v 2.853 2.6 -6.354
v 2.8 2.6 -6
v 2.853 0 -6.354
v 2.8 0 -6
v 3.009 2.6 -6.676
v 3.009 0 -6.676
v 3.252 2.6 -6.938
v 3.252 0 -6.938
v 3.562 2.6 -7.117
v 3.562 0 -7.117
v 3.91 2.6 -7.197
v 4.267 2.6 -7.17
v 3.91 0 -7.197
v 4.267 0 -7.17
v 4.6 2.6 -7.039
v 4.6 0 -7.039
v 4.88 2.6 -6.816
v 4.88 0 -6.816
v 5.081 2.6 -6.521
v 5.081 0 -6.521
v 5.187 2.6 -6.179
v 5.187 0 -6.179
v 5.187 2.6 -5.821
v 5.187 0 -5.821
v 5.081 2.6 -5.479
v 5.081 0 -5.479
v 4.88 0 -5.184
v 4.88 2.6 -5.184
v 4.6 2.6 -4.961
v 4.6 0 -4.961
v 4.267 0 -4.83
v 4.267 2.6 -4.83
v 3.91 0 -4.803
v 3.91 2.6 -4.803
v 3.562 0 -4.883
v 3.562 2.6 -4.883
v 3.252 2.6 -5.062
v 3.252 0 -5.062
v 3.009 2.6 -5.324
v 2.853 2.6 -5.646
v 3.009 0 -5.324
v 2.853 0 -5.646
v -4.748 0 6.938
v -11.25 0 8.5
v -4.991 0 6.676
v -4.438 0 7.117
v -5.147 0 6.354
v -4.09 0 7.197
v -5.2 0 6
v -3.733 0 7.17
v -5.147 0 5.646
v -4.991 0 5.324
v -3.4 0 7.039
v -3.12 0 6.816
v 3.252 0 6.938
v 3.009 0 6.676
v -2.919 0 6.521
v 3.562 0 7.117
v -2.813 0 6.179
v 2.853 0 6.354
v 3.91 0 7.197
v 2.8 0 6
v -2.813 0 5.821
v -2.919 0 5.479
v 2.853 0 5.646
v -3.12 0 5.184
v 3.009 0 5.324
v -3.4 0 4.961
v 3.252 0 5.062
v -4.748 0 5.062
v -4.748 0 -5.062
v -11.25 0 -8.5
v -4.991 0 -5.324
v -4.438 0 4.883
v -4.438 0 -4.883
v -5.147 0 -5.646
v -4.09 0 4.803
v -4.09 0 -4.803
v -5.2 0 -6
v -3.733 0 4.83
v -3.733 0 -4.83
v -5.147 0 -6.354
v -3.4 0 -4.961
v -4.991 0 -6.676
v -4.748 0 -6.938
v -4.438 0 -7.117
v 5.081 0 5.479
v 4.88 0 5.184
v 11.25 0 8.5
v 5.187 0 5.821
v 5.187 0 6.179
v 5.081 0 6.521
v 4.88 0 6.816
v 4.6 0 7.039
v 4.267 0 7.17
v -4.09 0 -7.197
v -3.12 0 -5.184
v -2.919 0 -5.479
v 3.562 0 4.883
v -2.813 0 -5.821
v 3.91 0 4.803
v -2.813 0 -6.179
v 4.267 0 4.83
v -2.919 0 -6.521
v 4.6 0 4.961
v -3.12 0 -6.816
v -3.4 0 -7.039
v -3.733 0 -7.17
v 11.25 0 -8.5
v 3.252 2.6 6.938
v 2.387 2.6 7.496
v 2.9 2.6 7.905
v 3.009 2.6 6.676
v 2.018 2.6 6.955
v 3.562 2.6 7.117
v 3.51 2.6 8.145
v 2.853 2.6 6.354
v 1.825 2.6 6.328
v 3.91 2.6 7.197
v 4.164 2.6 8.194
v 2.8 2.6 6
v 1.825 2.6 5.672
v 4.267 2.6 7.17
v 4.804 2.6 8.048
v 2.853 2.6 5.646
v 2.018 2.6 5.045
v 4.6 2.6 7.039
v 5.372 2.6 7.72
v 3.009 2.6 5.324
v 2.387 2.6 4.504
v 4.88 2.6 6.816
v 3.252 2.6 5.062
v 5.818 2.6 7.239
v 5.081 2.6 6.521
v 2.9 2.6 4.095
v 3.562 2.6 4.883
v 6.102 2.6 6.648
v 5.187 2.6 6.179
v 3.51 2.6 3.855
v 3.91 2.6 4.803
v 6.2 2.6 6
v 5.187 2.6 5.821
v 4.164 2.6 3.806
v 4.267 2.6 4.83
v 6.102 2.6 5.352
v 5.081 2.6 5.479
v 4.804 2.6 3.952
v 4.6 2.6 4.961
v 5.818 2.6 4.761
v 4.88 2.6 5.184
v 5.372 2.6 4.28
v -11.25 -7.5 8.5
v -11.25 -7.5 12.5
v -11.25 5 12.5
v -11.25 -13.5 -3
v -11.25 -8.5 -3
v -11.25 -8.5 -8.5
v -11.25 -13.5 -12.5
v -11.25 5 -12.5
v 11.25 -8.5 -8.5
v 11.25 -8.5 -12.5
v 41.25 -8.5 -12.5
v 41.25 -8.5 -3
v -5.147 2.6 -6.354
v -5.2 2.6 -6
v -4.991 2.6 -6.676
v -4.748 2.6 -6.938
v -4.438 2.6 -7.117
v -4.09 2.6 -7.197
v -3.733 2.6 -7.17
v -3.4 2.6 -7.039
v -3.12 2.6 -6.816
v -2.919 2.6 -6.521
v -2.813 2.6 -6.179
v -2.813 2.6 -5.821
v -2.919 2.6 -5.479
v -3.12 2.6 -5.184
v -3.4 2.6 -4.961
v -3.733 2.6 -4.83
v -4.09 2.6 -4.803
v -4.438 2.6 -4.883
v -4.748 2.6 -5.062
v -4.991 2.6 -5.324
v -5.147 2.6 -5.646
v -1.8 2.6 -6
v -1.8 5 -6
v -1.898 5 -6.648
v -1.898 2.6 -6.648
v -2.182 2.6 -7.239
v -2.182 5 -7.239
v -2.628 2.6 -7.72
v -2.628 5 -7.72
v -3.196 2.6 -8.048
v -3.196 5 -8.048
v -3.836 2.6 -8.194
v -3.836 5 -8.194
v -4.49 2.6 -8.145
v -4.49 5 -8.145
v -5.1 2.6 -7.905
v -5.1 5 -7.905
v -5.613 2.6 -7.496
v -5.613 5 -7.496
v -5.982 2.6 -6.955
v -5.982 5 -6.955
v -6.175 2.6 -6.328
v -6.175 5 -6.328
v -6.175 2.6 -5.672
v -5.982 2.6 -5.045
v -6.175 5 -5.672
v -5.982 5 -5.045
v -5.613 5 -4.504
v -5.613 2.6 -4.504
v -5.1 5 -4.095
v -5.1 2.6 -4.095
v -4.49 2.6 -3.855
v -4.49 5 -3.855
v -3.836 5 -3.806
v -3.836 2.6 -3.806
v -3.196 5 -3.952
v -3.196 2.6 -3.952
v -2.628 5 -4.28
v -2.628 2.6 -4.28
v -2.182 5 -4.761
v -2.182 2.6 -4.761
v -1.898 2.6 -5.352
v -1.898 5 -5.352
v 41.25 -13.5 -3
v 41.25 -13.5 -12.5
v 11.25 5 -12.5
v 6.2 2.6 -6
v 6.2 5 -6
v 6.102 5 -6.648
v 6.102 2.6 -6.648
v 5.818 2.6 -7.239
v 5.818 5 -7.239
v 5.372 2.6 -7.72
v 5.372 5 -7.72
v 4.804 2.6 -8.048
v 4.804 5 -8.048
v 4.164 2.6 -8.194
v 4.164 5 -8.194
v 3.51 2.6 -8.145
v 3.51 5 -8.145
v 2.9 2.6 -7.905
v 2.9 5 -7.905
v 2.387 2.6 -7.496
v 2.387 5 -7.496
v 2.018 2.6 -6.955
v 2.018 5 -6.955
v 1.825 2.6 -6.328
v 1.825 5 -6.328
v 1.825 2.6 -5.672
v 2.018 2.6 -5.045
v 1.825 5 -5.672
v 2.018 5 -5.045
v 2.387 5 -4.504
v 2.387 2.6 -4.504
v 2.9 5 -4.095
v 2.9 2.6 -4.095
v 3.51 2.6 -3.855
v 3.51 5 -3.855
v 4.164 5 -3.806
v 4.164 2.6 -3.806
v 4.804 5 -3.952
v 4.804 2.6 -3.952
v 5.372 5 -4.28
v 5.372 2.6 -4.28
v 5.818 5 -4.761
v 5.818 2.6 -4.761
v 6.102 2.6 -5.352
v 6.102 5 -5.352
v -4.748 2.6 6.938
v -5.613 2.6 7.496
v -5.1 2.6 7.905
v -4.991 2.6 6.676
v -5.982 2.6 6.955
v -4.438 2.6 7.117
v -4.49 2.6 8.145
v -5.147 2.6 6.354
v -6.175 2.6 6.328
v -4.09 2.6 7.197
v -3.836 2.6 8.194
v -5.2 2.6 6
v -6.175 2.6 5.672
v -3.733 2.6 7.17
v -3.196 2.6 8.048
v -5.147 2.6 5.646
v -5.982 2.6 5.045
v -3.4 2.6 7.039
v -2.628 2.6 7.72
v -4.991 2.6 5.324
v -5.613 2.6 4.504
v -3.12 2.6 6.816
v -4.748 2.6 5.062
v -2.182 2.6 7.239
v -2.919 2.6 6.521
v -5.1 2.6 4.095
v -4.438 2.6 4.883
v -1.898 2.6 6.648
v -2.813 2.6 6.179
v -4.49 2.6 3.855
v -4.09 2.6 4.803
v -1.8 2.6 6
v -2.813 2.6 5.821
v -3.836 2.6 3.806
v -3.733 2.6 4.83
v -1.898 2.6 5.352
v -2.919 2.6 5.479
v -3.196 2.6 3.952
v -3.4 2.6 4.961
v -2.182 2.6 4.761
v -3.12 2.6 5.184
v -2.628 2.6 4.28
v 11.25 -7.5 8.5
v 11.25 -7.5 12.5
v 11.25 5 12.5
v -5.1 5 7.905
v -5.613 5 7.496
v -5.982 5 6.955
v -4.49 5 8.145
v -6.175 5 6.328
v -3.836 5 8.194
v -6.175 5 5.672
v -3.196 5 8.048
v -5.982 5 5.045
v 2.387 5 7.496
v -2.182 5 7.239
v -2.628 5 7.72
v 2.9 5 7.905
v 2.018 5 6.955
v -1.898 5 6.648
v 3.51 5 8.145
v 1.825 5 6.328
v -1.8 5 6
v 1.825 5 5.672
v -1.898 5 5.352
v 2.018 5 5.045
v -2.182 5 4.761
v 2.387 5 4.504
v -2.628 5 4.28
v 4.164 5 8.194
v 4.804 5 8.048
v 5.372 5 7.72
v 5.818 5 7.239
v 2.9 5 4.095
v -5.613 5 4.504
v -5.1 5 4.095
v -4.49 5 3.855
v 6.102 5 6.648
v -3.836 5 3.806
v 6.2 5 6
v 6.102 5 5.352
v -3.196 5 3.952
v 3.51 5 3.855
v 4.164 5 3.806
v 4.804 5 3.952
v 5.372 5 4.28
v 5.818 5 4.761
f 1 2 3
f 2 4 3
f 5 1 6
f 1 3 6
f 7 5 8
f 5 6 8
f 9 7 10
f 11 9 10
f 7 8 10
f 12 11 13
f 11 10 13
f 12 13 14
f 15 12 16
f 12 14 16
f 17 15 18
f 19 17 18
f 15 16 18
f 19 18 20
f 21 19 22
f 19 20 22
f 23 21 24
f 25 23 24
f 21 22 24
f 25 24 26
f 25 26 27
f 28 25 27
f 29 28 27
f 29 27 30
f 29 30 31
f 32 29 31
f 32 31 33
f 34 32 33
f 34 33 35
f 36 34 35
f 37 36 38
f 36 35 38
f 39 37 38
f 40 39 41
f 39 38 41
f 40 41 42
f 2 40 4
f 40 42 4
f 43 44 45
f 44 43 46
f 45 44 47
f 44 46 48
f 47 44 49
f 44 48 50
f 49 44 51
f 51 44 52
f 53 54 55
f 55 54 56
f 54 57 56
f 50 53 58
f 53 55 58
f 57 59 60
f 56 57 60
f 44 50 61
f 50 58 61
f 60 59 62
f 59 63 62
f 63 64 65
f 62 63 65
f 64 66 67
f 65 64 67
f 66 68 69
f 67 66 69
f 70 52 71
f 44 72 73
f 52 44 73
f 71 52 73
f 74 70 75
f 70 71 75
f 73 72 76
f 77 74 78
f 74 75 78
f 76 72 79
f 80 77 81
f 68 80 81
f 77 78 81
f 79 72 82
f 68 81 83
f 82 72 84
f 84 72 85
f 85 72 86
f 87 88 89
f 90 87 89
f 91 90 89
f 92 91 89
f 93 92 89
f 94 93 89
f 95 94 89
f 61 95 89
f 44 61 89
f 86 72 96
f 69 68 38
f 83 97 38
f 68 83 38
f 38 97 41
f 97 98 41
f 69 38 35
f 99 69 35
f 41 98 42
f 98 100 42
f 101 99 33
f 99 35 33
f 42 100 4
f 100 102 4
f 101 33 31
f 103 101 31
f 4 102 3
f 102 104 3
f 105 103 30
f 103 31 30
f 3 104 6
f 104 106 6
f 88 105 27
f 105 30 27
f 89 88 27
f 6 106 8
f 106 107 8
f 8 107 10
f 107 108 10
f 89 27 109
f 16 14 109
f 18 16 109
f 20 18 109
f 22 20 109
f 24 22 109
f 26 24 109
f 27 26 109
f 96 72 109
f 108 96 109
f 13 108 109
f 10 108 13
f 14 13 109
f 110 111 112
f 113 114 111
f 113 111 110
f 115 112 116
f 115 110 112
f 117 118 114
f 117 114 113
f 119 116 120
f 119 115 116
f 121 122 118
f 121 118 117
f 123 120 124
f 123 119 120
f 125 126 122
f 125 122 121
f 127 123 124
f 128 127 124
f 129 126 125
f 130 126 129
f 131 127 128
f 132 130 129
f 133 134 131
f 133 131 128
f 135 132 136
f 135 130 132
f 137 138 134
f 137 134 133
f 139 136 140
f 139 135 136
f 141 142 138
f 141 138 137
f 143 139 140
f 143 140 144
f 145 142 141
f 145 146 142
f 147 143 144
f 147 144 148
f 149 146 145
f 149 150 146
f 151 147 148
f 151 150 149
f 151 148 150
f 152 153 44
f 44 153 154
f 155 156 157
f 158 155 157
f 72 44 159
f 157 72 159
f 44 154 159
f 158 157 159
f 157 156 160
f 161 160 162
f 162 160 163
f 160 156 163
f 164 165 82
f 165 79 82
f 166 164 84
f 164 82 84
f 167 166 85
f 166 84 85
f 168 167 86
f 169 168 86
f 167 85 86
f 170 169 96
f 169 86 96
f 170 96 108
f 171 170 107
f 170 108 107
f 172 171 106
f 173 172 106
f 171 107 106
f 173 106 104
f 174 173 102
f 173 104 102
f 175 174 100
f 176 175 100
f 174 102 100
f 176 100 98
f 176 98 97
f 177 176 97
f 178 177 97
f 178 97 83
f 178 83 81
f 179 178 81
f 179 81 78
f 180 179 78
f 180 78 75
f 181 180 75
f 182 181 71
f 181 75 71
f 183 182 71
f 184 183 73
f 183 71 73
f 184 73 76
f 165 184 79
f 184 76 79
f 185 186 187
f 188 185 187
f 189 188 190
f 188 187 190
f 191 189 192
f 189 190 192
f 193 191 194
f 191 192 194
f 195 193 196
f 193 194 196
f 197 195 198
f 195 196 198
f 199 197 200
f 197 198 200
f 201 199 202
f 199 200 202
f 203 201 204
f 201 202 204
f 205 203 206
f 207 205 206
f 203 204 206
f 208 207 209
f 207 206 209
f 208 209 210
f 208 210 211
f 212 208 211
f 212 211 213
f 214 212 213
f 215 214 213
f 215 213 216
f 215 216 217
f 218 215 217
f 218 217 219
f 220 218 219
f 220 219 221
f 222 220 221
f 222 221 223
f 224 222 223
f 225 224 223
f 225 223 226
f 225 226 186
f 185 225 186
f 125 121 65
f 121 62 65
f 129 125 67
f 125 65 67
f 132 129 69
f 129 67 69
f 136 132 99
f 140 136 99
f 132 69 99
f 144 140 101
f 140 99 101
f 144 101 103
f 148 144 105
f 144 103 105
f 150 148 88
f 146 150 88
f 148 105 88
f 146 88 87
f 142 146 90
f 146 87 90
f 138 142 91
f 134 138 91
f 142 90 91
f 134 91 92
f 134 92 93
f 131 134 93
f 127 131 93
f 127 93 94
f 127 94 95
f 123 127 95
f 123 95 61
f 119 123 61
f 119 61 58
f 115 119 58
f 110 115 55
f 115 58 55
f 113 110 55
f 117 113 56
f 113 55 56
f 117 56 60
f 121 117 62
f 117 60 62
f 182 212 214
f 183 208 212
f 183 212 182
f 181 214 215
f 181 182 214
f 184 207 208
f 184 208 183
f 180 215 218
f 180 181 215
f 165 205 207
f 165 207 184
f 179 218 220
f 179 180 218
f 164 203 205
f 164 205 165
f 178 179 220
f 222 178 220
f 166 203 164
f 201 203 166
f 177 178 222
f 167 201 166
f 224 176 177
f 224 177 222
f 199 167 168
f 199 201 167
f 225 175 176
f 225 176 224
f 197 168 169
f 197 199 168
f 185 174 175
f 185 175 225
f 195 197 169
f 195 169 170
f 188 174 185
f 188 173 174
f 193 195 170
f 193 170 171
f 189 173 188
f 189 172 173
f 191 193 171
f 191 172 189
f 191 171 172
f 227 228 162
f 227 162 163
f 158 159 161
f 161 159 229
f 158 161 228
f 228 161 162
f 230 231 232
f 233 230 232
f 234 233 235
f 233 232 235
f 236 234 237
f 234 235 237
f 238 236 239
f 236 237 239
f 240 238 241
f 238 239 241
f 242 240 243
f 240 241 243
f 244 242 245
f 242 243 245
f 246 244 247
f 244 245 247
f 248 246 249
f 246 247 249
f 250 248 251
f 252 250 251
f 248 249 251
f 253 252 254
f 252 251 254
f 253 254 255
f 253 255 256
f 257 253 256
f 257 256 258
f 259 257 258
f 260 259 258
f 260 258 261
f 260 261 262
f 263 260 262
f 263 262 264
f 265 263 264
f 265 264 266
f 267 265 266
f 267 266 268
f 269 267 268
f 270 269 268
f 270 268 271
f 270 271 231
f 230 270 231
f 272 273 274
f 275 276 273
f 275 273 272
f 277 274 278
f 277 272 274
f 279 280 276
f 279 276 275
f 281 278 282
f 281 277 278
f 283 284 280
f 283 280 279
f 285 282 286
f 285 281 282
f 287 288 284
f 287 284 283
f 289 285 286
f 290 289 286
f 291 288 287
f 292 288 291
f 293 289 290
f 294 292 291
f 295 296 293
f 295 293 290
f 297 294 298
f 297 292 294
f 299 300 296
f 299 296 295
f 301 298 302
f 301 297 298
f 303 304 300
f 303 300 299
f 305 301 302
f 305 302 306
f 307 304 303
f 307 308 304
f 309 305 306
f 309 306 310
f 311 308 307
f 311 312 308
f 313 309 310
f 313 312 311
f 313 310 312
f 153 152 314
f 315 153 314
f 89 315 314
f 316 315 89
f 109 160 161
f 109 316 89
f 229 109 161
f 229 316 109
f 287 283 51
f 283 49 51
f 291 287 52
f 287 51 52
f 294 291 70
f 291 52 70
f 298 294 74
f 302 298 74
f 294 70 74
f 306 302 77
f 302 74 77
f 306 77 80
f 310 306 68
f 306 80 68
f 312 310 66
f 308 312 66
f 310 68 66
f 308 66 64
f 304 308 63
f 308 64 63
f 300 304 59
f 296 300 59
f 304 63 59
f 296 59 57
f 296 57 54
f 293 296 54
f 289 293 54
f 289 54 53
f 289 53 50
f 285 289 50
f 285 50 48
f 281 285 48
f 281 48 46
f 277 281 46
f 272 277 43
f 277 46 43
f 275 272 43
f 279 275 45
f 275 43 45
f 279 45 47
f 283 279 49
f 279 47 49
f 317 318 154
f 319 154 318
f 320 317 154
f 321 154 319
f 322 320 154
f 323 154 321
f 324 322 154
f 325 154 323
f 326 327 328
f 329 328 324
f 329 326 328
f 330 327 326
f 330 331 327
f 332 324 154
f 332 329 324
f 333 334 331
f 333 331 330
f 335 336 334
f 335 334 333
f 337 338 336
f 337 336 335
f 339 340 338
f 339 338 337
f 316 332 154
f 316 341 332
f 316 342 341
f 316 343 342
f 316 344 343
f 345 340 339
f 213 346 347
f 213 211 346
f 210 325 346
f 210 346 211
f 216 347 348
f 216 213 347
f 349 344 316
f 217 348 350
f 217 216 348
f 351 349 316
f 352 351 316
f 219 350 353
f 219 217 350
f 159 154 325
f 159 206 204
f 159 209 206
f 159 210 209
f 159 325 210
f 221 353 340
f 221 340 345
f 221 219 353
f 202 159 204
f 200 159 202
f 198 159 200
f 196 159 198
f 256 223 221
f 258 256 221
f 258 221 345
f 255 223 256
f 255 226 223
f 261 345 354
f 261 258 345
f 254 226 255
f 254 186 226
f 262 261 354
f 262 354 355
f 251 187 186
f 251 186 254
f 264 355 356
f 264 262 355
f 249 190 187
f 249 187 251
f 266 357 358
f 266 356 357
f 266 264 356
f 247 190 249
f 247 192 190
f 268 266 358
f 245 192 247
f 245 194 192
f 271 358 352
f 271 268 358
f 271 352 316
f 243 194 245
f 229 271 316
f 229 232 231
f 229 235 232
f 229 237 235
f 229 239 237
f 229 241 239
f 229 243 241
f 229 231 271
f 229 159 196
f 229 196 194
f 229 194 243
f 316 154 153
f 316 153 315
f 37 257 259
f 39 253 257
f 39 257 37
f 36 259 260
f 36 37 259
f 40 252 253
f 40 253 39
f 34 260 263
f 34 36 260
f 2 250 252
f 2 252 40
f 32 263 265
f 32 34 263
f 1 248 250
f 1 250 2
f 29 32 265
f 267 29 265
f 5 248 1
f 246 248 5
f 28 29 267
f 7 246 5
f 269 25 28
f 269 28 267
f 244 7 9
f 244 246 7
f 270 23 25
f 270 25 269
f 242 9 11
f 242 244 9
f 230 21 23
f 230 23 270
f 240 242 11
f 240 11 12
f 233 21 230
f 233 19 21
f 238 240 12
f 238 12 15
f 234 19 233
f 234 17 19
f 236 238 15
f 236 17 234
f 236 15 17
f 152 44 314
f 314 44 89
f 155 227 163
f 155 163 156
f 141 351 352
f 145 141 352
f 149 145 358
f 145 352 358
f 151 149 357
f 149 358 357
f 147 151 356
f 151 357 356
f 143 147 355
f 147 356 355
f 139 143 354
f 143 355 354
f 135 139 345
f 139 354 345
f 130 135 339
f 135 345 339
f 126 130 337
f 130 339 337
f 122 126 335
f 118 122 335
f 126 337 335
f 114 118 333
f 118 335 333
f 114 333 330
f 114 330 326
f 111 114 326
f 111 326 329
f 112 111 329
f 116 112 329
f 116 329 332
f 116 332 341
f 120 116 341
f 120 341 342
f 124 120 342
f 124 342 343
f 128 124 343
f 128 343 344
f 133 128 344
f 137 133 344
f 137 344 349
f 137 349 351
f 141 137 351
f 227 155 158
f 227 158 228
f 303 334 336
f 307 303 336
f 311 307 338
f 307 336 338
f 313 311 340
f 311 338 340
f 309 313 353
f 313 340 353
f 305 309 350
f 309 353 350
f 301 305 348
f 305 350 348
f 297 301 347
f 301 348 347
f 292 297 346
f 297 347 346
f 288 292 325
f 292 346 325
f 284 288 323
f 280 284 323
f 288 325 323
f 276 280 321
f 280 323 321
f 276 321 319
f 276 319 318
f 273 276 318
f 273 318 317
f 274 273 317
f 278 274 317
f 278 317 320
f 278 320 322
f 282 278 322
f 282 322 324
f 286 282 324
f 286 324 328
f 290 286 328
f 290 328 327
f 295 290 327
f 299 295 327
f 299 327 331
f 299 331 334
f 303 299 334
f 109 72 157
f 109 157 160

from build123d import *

# Parameters (mm, degrees)
SKETCH1_W                                           = 22.5
SKETCH1_H                                           = 17
SKETCH1_H_2                                         = 25
BOSS_EXTRUDE1_DEPTH                                 = 5
SKETCH1_3_W                                         = 22.5
SKETCH1_3_H                                         = 4
BOSS_EXTRUDE2_DEPTH                                 = 13.5
CBORE_FOR_M2_HEX_SOCKET_HEAD_CAP_SCREW1_D           = 2.4
CBORE_FOR_M2_HEX_SOCKET_HEAD_CAP_SCREW1_CBORE_D     = 4.4
CBORE_FOR_M2_HEX_SOCKET_HEAD_CAP_SCREW1_CBORE_DEPTH = 2.4
BOSS_EXTRUDE3_DEPTH                                 = 5
SKETCH1_4_W                                         = 22.5
SKETCH1_4_H                                         = 4
BOSS_EXTRUDE4_DEPTH                                 = 7.5


with BuildPart() as part:
    # Sketch1 → Boss-Extrude1 (new body)
    with BuildSketch(Plane(origin=(0, 0, 0), x_dir=(1, 0, 0), z_dir=(0, 1, 0))):
        Rectangle(SKETCH1_W, SKETCH1_H)
        Rectangle(SKETCH1_W, SKETCH1_H_2)
    extrude(amount=BOSS_EXTRUDE1_DEPTH)

    # Sketch1<3> → Boss-Extrude2 (add)
    with BuildSketch(Plane(origin=(0, 0, 0), x_dir=(1, 0, 0), z_dir=(0, 1, 0))):
        with Locations((0, 10.5)):
            Rectangle(SKETCH1_3_W, SKETCH1_3_H)
    extrude(amount=-BOSS_EXTRUDE2_DEPTH)

    # CBORE for M2 Hex Socket Head Cap Screw1 (through all)
    with Locations(Plane(origin=(0, 5, 0), x_dir=(1, 0, 0), z_dir=(0, 1, 0))):
        with Locations((-4, -6), (4, 6), (-4, 6), (4, -6)):
            CounterBoreHole(CBORE_FOR_M2_HEX_SOCKET_HEAD_CAP_SCREW1_D / 2, CBORE_FOR_M2_HEX_SOCKET_HEAD_CAP_SCREW1_CBORE_D / 2, CBORE_FOR_M2_HEX_SOCKET_HEAD_CAP_SCREW1_CBORE_DEPTH)

    # Sketch5 → Boss-Extrude3 (add)
    with BuildSketch(Plane.XZ.offset(13.5)):
        Polygon((-11.25, -3), (-11.25, -8.5), (11.25, -8.5), (11.25, -12.5), (41.25, -12.5), (41.25, -3), align=None)
    extrude(amount=-BOSS_EXTRUDE3_DEPTH)

    # Sketch1<4> → Boss-Extrude4 (add)
    with BuildSketch(Plane(origin=(0, 0, 0), x_dir=(1, 0, 0), z_dir=(0, 1, 0))):
        with Locations((0, -10.5)):
            Rectangle(SKETCH1_4_W, SKETCH1_4_H)
    extrude(amount=-BOSS_EXTRUDE4_DEPTH)


solid = part.part
